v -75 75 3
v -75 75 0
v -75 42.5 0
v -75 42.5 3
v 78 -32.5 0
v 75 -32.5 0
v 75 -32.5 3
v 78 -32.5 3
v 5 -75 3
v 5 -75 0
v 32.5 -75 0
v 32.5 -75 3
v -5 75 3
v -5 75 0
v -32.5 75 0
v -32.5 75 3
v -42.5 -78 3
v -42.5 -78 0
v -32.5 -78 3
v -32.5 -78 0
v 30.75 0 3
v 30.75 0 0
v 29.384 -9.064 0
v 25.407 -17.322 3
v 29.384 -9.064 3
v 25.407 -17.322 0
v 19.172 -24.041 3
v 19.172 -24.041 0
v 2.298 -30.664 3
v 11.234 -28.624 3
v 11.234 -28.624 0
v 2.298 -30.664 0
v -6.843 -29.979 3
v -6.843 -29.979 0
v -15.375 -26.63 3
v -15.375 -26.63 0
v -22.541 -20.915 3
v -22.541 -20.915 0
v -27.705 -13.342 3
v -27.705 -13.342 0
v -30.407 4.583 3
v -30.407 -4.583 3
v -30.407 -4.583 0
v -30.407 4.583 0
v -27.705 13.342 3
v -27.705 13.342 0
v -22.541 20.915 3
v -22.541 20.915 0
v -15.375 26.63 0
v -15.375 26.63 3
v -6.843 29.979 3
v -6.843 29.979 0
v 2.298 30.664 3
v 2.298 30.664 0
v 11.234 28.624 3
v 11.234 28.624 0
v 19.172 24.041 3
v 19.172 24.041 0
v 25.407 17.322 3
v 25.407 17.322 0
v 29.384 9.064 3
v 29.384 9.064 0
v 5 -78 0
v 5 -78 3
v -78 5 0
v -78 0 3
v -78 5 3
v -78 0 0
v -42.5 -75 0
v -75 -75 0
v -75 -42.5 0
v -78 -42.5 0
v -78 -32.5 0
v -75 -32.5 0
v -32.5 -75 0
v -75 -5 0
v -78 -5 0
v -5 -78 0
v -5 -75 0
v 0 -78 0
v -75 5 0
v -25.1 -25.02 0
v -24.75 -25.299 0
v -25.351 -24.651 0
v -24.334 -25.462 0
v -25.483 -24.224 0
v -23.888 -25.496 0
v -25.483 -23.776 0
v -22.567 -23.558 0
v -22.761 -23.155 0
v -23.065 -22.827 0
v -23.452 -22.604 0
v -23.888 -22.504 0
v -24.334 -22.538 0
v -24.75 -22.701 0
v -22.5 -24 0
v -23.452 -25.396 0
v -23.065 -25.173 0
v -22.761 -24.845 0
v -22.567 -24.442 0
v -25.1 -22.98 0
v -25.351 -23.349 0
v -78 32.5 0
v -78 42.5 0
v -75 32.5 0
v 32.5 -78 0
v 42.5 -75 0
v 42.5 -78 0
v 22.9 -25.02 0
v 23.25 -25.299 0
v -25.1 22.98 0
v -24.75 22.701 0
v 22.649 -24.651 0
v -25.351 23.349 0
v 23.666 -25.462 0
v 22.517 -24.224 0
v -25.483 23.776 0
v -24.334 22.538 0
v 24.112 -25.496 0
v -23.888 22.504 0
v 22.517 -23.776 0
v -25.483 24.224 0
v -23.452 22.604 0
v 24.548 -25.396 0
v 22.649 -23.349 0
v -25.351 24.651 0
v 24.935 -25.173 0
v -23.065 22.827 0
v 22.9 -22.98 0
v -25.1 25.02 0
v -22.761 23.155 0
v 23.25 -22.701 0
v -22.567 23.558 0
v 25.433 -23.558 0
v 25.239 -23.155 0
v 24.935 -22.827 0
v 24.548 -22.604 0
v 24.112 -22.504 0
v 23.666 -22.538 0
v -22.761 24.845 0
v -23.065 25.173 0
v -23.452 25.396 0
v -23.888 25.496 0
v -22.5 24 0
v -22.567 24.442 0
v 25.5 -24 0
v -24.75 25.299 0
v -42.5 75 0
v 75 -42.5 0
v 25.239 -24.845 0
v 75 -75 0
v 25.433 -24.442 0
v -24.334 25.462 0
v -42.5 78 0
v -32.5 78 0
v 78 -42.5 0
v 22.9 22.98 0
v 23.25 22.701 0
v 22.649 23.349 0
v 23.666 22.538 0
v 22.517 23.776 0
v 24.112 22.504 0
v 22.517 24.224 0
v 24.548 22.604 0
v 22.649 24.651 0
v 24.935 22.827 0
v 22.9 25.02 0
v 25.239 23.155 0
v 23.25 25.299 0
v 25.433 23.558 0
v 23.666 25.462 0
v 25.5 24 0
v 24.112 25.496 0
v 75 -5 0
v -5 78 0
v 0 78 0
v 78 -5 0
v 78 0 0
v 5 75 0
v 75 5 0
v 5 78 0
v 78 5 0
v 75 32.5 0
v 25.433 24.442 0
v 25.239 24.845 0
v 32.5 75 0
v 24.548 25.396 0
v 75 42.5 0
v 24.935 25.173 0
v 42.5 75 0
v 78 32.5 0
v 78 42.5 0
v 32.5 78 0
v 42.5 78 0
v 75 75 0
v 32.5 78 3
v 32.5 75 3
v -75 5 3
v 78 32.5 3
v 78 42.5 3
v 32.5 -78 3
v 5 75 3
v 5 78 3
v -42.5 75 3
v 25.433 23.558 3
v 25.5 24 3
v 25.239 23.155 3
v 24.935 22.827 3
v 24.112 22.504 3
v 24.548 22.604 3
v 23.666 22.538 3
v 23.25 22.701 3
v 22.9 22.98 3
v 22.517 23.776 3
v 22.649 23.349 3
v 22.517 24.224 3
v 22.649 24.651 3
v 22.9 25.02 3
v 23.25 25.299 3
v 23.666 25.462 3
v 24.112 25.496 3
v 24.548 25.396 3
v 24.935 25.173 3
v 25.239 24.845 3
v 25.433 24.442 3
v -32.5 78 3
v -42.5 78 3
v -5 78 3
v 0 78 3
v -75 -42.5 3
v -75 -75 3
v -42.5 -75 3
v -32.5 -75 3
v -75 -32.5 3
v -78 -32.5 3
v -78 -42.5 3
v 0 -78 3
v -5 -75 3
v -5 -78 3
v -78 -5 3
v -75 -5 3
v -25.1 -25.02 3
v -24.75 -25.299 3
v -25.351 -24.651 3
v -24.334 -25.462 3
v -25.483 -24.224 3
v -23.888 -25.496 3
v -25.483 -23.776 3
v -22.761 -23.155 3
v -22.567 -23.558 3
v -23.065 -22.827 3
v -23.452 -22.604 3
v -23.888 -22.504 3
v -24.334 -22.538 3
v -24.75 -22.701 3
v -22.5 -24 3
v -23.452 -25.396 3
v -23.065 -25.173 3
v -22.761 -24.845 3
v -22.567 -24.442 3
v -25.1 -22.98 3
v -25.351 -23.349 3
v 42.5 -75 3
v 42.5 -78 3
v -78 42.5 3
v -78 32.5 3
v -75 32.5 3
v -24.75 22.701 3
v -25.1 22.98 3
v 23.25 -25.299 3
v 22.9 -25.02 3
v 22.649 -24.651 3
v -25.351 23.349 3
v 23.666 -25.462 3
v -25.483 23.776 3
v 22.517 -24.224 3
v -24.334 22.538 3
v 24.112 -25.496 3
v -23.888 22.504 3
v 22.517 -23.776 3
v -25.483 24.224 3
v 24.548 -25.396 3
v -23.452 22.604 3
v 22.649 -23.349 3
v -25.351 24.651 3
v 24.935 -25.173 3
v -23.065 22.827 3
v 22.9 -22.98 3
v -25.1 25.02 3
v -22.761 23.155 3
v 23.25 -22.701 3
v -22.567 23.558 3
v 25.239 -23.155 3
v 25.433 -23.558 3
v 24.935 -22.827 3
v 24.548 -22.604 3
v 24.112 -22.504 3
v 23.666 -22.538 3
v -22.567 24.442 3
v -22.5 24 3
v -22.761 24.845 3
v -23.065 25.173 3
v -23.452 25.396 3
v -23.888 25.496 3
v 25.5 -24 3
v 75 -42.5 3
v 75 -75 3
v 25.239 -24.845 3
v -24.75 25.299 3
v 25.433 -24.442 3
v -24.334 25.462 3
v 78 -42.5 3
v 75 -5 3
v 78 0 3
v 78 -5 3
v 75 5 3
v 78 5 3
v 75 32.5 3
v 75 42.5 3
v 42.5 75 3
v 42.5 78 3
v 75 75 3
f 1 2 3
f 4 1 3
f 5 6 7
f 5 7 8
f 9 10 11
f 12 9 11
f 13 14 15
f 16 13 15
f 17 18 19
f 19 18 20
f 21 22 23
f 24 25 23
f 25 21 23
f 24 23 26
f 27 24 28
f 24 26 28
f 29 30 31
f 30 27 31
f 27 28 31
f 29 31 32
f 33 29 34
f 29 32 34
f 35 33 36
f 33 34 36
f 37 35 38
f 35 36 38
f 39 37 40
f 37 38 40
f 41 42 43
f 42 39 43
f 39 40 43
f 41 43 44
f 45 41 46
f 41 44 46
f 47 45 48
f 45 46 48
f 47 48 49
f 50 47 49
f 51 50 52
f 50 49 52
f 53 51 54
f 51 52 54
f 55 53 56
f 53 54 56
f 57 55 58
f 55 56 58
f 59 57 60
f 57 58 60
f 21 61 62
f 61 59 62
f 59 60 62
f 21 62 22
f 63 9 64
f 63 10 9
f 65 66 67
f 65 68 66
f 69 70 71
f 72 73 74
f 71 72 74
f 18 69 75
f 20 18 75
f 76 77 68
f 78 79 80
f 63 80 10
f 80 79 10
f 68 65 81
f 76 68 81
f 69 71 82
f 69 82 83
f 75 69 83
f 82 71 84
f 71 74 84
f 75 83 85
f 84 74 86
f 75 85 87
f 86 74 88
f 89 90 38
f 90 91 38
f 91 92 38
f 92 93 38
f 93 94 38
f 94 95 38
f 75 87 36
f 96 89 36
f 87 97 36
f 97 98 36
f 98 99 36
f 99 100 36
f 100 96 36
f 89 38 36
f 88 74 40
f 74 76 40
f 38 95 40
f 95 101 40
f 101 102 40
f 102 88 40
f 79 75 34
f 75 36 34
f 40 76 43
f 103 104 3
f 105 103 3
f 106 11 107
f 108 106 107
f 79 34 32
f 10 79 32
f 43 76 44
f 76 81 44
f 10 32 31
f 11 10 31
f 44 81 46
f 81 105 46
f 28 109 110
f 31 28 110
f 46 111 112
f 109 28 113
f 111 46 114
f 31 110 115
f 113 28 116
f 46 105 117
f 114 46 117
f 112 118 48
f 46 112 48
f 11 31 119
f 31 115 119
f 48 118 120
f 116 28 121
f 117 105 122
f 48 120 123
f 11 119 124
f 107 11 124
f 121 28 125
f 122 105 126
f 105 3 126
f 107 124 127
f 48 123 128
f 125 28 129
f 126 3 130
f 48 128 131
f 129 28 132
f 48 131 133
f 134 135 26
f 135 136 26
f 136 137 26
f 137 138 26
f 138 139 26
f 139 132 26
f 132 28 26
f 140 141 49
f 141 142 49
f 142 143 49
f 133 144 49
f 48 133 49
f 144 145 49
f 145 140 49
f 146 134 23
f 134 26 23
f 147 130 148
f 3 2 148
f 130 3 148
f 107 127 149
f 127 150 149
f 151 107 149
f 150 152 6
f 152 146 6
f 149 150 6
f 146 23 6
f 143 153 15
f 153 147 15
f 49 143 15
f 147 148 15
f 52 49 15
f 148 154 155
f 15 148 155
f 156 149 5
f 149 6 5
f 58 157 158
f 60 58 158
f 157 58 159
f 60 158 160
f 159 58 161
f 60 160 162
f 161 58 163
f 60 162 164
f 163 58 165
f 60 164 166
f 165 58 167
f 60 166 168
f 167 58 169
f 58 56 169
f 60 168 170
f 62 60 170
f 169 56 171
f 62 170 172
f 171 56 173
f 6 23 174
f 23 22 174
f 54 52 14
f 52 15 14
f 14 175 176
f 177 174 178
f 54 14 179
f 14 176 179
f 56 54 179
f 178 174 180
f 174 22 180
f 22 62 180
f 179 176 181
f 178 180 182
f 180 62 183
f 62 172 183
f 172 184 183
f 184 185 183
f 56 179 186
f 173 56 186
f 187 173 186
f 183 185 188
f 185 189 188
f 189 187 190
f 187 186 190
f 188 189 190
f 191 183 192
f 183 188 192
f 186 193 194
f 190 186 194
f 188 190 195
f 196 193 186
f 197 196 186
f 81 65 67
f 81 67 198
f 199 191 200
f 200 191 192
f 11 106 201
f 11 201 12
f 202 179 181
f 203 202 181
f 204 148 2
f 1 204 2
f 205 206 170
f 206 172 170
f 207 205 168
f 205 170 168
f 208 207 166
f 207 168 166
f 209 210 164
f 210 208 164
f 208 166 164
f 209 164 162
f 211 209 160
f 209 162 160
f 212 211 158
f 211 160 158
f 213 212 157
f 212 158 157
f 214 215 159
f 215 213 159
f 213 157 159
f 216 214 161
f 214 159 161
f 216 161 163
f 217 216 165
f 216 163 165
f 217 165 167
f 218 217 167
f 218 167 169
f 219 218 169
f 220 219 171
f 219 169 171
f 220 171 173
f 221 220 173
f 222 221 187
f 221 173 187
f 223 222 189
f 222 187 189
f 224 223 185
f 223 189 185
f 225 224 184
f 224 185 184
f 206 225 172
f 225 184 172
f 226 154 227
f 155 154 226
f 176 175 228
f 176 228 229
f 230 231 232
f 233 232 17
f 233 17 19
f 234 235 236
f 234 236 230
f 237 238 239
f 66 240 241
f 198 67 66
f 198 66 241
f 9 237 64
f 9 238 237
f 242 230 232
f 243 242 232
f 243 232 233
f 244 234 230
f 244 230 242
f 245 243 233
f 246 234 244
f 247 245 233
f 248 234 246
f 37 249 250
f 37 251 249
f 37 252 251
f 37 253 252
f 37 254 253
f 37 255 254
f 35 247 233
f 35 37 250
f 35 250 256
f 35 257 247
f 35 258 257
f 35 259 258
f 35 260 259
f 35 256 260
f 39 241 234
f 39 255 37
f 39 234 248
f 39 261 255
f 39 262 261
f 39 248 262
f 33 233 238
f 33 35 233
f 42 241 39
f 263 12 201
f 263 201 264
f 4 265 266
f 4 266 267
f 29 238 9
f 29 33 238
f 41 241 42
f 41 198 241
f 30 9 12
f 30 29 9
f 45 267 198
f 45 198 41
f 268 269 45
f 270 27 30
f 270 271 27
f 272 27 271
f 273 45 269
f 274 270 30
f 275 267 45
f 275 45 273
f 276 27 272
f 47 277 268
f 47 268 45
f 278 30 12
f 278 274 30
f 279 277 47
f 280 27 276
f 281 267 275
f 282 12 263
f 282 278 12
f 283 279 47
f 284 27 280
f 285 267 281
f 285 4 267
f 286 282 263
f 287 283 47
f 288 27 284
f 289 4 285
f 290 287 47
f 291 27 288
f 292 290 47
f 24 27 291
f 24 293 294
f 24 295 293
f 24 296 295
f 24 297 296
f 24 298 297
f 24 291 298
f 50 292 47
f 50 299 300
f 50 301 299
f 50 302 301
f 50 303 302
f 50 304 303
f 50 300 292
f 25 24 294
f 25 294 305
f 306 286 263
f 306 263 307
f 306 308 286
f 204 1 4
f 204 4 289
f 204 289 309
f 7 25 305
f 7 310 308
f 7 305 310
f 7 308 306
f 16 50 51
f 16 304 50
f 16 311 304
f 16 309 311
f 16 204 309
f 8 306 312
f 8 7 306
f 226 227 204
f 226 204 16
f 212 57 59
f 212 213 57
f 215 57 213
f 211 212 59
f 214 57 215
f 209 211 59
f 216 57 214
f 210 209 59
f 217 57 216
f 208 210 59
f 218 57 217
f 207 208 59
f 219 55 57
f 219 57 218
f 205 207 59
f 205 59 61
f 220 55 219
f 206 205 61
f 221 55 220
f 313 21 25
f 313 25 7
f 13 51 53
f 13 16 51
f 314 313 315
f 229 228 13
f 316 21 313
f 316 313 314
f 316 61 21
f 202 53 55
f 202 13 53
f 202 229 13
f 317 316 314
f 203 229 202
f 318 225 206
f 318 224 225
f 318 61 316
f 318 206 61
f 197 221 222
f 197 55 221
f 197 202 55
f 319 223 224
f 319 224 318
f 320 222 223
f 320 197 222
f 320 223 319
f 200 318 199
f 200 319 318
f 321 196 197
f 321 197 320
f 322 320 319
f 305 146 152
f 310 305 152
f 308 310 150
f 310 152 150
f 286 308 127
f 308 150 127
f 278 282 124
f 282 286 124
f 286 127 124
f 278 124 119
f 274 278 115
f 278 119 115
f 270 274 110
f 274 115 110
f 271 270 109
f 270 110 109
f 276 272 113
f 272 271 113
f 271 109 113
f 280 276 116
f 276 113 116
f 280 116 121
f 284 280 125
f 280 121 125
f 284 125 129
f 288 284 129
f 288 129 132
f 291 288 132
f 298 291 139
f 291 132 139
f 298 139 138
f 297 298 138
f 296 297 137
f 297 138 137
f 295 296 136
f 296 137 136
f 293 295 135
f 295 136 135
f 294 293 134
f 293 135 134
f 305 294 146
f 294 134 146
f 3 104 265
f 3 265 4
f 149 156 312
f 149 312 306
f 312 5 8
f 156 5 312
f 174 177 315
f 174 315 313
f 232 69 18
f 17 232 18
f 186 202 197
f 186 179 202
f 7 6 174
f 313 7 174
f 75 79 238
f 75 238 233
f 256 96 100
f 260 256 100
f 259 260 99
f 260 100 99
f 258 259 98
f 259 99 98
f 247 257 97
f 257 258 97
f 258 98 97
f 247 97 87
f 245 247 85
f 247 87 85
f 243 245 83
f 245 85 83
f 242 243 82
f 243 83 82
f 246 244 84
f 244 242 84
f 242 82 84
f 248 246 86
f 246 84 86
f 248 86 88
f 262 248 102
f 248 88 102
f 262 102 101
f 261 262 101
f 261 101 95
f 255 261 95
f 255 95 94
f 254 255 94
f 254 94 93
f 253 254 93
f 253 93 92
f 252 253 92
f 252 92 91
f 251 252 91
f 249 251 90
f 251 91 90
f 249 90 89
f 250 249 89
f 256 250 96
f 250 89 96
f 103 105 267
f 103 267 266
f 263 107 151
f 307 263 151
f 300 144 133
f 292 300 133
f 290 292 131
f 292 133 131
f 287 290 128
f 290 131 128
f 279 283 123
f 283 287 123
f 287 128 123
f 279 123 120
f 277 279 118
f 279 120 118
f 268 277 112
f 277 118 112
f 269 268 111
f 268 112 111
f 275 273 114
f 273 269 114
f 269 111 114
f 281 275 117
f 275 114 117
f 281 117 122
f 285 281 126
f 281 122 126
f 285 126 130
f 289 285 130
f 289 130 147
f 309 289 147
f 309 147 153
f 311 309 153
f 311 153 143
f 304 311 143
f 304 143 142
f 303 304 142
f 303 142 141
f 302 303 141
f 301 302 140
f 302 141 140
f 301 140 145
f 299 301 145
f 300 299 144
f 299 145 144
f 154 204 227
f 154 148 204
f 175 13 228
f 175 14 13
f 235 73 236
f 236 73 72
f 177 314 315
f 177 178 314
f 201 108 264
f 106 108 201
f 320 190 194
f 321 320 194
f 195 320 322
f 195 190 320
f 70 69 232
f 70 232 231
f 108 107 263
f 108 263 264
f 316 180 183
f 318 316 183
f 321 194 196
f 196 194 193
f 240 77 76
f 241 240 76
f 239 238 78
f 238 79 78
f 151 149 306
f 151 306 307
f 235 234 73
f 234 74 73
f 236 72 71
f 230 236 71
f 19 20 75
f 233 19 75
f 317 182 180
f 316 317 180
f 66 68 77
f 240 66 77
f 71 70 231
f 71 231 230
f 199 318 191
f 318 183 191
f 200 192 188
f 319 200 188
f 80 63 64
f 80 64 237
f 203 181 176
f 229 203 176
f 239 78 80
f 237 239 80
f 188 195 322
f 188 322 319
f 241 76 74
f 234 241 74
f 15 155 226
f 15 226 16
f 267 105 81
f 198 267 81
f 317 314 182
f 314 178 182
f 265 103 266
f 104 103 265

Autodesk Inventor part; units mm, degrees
ref_plane "YZ Plane" through (0, 0, 0) normal (1, 0, 0) x (0, 1, 0)
ref_plane "XZ Plane" through (0, 0, 0) normal (0, 1, 0) x (-1, 0, 0)
ref_plane "XY Plane" through (0, 0, 0) normal (0, 0, 1) x (1, 0, 0)
sketch "Эскиз1" plane through (0, 0, 0) normal (0, 0, 1) x (1, 0, 0)
  circle A0 centre (0, 0) radius 30.75
  circle A1 centre (24, -24) radius 1.5
  circle A2 centre (24, 24) radius 1.5
  circle A3 centre (-24, 24) radius 1.5
  circle A4 centre (-24, -24) radius 1.5
  line L0 (-78, 42.5) -> (-75, 42.5)
  line L1 (-75, 32.5) -> (-78, 32.5)
  line L2 (-78, 32.5) -> (-78, 42.5)
  line L3 (-78, 5) -> (-75, 5)
  line L4 (-78, 0) -> (-78, 5)
  line L5 (-42.5, 78) -> (-32.5, 78)
  line L6 (-32.5, 78) -> (-32.5, 75)
  line L7 (-42.5, 75) -> (-42.5, 78)
  line L8 (-5, 78) -> (0, 78)
  line L9 (-5, 75) -> (-5, 78)
  line L10 (-5, 75) -> (-32.5, 75)
  line L11 (-42.5, 75) -> (-75, 75)
  line L12 (-75, 75) -> (-75, 42.5)
  line L13 (-75, 32.5) -> (-75, 5)
  line L14 (78, 42.5) -> (75, 42.5)
  line L15 (75, 32.5) -> (78, 32.5)
  line L16 (78, 32.5) -> (78, 42.5)
  line L17 (78, 5) -> (75, 5)
  line L18 (78, 0) -> (78, 5)
  line L19 (42.5, 78) -> (32.5, 78)
  line L20 (32.5, 78) -> (32.5, 75)
  line L21 (42.5, 75) -> (42.5, 78)
  line L22 (5, 78) -> (0, 78)
  line L23 (5, 75) -> (5, 78)
  line L24 (5, 75) -> (32.5, 75)
  line L25 (42.5, 75) -> (75, 75)
  line L26 (75, 5) -> (75, 32.5)
  line L27 (75, 75) -> (75, 42.5)
  line L28 (-78, -42.5) -> (-75, -42.5)
  line L29 (-75, -32.5) -> (-78, -32.5)
  line L30 (-78, -32.5) -> (-78, -42.5)
  line L31 (-78, -5) -> (-75, -5)
  line L32 (-78, 0) -> (-78, -5)
  line L33 (-42.5, -78) -> (-32.5, -78)
  line L34 (-32.5, -78) -> (-32.5, -75)
  line L35 (-42.5, -75) -> (-42.5, -78)
  line L36 (-5, -78) -> (0, -78)
  line L37 (-5, -75) -> (-5, -78)
  line L38 (-5, -75) -> (-32.5, -75)
  line L39 (-42.5, -75) -> (-75, -75)
  line L40 (-75, -5) -> (-75, -32.5)
  line L41 (-75, -75) -> (-75, -42.5)
  line L42 (75, -32.5) -> (78, -32.5)
  line L43 (75, -32.5) -> (75, -5)
  line L44 (78, -5) -> (75, -5)
  line L45 (78, 0) -> (78, -5)
  line L46 (78, -42.5) -> (75, -42.5)
  line L47 (78, -32.5) -> (78, -42.5)
  line L48 (5, -75) -> (32.5, -75)
  line L49 (5, -78) -> (0, -78)
  line L50 (5, -75) -> (5, -78)
  line L51 (75, -42.5) -> (75, -75)
  line L52 (42.5, -75) -> (75, -75)
  line L53 (32.5, -78) -> (32.5, -75)
  line L54 (42.5, -78) -> (32.5, -78)
  line L55 (42.5, -75) -> (42.5, -78)
extrude "Выдавливание1" add sketch "Эскиз1" along normal blind 3
properties part number "Верх"
